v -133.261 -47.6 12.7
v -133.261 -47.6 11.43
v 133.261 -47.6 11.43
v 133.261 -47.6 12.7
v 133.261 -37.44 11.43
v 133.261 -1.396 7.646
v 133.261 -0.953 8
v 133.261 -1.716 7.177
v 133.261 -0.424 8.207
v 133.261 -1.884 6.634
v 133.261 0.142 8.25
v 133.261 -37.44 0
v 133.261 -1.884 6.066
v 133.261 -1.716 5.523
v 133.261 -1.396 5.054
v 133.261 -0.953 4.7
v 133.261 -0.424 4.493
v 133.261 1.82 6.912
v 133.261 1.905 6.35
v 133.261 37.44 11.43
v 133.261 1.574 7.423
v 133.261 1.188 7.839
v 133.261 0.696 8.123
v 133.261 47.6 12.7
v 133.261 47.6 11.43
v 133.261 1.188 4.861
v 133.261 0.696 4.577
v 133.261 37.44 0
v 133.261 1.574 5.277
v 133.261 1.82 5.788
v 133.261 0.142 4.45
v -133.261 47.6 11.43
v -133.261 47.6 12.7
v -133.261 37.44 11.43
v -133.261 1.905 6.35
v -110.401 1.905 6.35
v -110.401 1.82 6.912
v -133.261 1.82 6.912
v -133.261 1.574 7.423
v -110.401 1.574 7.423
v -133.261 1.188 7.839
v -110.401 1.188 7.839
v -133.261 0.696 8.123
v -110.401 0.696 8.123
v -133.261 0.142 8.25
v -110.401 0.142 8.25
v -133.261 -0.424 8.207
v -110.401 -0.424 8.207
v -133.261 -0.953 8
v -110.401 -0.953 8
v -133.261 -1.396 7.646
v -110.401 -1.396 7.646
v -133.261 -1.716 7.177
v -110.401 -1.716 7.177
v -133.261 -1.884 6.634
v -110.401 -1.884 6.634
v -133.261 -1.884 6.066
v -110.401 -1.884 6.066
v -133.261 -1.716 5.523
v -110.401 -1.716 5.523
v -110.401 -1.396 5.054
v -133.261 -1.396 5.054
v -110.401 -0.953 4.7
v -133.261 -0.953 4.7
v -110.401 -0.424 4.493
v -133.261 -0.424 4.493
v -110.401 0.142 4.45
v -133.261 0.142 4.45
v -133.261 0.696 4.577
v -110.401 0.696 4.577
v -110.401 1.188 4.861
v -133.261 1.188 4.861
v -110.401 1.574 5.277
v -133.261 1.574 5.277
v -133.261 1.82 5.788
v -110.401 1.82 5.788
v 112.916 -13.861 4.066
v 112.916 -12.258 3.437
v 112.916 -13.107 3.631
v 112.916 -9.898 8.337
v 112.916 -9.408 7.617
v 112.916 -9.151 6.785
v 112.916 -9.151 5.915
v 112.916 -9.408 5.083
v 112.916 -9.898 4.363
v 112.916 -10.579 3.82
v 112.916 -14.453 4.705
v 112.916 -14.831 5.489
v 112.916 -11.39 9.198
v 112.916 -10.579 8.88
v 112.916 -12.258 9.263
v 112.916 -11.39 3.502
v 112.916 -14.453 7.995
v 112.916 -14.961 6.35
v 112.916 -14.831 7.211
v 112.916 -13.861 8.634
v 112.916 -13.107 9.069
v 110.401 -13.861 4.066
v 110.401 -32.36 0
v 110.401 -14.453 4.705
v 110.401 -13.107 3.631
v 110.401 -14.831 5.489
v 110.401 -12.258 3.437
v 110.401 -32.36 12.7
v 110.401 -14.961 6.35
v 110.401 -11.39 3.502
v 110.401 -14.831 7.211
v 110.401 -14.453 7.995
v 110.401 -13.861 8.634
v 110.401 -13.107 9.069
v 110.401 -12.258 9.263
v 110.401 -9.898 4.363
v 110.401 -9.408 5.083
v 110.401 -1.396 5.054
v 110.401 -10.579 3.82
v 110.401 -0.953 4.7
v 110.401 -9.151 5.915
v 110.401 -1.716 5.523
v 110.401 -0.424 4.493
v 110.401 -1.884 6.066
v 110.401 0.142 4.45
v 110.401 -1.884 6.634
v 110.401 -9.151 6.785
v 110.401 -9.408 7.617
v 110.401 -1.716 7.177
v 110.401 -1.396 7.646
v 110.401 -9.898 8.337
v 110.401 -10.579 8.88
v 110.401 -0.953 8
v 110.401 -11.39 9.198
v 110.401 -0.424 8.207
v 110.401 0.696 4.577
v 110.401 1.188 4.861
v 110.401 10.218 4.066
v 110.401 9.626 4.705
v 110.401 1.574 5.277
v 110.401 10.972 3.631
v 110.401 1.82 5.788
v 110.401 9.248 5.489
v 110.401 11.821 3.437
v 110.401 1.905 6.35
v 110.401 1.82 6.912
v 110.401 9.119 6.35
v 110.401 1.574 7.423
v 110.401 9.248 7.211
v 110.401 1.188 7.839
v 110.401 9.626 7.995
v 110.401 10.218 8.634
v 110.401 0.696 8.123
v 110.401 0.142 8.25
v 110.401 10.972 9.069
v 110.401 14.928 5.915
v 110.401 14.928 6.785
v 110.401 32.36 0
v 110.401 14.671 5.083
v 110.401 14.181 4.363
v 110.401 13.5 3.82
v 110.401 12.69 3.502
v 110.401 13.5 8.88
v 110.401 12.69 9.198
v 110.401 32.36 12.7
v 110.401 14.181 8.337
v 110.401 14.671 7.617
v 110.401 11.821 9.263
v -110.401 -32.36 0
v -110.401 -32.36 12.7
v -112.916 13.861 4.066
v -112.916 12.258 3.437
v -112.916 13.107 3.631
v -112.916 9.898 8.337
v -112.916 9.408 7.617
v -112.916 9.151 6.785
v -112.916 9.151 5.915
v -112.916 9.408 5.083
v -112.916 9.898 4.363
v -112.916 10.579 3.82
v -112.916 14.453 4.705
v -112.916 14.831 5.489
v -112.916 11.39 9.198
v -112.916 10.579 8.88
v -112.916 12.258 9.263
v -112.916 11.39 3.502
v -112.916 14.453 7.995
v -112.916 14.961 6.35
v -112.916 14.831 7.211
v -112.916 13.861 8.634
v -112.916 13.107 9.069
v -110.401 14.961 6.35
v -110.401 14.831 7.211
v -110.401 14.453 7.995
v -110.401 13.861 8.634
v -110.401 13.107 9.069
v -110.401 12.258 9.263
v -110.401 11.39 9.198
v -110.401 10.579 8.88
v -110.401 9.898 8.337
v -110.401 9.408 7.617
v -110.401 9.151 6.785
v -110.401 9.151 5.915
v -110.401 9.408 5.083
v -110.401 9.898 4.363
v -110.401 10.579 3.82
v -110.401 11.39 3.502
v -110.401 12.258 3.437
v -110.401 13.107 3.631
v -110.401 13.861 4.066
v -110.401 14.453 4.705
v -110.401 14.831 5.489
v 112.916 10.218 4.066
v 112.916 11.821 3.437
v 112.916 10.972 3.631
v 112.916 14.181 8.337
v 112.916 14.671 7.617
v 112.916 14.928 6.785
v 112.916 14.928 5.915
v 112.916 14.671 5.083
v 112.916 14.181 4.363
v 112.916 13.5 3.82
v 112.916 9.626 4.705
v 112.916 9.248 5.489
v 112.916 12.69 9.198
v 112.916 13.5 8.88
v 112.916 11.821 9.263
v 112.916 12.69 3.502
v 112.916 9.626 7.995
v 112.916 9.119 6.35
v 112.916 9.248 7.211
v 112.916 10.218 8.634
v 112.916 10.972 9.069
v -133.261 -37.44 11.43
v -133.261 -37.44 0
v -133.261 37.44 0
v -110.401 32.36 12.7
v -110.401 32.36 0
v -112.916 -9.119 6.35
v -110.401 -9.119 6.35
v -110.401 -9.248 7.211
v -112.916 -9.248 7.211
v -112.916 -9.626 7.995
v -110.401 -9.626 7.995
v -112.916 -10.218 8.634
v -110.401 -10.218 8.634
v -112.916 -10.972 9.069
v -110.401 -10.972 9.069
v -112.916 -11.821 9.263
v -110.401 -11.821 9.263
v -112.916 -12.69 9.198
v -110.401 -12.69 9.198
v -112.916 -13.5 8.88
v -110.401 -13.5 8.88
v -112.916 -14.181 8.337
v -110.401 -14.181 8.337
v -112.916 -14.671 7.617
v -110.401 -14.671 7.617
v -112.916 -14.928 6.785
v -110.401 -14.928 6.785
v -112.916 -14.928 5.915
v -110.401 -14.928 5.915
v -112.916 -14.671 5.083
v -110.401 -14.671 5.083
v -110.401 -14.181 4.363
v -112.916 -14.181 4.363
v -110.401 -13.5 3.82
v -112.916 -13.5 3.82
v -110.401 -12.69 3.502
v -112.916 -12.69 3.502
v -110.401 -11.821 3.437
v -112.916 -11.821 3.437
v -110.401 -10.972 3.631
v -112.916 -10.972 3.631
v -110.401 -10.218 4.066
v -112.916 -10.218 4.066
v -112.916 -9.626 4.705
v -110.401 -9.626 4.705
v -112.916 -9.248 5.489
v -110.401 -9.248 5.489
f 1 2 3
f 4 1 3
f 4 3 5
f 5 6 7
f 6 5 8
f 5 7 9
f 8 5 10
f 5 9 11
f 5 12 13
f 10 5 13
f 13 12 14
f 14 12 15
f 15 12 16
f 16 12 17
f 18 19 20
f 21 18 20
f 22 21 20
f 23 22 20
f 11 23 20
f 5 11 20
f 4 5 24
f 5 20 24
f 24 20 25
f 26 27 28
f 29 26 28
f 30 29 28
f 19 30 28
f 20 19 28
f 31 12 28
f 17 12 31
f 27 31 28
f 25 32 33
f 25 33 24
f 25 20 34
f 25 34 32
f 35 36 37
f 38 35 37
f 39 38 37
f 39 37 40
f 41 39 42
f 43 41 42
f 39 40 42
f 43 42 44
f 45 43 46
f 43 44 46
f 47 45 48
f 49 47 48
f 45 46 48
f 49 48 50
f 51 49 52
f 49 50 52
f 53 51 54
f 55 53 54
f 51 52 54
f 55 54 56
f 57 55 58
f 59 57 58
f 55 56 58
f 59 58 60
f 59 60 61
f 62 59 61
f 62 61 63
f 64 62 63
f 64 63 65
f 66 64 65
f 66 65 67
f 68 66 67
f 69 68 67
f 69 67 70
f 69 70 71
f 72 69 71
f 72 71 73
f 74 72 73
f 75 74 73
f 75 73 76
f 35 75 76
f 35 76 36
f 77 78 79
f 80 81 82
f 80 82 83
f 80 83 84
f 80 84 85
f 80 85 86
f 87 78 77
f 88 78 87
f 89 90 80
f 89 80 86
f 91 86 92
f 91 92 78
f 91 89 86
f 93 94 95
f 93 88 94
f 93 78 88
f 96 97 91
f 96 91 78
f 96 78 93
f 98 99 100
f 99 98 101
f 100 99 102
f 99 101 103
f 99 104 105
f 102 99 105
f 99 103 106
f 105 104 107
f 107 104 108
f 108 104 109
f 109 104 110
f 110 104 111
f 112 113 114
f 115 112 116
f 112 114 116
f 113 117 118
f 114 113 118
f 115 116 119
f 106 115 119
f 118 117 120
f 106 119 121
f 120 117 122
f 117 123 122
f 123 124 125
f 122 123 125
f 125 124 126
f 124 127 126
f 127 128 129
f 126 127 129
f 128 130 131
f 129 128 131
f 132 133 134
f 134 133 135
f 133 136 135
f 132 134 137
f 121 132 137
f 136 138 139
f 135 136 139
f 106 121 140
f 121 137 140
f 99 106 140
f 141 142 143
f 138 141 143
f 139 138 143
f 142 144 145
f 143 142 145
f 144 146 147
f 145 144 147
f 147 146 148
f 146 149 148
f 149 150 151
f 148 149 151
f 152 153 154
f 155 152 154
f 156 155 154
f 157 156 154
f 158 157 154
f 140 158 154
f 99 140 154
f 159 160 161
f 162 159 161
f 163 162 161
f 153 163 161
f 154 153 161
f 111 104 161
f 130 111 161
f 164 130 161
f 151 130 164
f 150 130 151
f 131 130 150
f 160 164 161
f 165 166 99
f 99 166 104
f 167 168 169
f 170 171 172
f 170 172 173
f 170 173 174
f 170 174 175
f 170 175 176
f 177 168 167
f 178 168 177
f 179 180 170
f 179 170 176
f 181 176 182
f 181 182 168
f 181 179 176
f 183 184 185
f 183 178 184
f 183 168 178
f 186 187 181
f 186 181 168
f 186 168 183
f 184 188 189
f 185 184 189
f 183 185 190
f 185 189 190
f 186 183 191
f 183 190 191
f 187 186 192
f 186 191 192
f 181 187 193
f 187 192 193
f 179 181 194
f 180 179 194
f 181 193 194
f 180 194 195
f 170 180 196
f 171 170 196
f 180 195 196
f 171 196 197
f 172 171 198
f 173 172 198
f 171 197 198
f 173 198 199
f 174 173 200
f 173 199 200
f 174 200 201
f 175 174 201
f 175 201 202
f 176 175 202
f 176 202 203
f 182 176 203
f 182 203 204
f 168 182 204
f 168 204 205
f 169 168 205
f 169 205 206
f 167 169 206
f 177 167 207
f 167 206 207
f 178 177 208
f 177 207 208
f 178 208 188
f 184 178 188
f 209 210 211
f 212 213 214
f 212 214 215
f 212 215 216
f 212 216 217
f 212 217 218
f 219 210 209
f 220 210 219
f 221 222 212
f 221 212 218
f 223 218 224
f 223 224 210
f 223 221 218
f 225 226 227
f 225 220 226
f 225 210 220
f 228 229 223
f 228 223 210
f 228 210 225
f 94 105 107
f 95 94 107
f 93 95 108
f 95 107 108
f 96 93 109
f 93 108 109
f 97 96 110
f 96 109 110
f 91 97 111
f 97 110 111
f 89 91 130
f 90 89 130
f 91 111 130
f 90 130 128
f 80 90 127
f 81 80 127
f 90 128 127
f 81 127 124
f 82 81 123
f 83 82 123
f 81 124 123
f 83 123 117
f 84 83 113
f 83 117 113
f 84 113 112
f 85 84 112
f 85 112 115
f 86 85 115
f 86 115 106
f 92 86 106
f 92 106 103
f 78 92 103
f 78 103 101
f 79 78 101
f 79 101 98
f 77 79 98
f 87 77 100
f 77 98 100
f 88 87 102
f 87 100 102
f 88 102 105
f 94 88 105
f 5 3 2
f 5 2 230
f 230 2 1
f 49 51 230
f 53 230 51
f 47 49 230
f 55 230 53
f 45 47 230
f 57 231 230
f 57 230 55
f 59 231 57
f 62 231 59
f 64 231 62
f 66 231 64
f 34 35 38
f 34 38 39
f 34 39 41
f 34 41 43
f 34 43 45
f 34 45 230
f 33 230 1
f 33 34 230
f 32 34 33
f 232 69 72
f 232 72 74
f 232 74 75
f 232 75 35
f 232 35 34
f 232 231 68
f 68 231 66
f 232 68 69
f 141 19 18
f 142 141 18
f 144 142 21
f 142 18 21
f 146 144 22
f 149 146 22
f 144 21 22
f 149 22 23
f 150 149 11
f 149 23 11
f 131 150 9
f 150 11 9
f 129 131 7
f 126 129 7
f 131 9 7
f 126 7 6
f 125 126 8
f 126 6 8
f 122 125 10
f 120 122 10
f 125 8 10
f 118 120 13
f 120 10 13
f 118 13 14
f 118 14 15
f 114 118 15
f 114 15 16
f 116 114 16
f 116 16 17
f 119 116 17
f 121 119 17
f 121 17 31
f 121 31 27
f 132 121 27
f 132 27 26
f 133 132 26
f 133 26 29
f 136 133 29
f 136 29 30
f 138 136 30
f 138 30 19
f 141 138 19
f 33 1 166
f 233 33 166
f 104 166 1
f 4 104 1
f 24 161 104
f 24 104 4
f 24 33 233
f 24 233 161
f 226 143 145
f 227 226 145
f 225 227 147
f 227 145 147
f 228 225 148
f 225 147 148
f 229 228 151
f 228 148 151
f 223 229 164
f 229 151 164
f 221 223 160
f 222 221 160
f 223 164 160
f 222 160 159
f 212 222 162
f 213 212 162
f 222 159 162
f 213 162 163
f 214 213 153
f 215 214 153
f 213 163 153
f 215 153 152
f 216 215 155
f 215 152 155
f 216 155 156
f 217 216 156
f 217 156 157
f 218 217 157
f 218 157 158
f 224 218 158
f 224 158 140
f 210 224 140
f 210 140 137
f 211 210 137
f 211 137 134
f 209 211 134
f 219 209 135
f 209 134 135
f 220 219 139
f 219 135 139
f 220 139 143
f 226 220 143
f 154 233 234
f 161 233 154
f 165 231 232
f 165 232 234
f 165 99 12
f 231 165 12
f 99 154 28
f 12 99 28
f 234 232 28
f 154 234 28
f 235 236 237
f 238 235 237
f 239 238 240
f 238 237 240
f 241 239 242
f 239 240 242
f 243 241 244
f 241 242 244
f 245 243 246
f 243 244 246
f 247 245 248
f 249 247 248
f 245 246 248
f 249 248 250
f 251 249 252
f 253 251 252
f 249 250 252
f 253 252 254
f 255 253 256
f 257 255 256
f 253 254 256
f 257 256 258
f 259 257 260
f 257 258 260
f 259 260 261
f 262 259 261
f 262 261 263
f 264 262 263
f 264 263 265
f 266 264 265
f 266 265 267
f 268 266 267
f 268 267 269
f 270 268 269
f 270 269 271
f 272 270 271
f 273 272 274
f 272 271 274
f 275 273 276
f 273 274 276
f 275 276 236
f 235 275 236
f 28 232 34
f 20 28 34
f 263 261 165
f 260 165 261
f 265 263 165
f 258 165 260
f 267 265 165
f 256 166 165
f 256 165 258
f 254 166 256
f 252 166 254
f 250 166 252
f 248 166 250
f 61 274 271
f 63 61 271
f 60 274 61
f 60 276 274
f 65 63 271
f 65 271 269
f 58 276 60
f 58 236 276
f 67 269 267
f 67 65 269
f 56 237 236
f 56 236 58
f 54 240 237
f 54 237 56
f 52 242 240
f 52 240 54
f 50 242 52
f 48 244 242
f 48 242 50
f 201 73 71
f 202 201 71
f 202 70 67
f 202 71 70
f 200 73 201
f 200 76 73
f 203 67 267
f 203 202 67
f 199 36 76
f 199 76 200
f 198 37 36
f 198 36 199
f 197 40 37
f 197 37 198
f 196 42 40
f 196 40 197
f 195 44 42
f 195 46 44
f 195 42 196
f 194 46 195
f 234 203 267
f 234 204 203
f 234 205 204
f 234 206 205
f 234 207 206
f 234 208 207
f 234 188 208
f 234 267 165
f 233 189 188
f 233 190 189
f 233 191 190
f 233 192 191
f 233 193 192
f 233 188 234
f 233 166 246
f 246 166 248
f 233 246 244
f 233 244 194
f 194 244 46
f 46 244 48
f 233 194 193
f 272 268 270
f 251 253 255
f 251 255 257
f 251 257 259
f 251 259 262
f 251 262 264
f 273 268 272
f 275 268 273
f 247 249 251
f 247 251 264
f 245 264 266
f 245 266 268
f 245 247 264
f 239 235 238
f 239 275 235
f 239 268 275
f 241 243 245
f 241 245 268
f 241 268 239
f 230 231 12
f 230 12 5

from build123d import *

# Parameters (mm, degrees)
F0_W      = 266.5222
F0_H      = 95.1992
F1_DEPTH  = 12.7
F2_W      = 220.8022
F2_H      = 64.7192
F2_W_2    = 215.7222
F2_H_2    = 44.3992
F3_DEPTH  = 25.4
F4_R      = 1.905
F5_DEPTH  = 508
F6_R      = 2.921
F7_DEPTH  = 2.5146
F8_R      = 2.921
F9_DEPTH  = 2.5146
F10_W     = 10.16
F10_H     = 11.43
F11_DEPTH = 508


with BuildPart() as f1:
    # F0 (on Top) → F1 (new body)
    with BuildSketch(Plane.XY):
        Rectangle(F0_W, F0_H)
    extrude(amount=F1_DEPTH)

    # F2 (on face) → F3 (cut)
    with BuildSketch(Plane.XY.offset(12.7)):
        Rectangle(F2_W, F2_H)
        Rectangle(F2_W_2, F2_H_2, mode=Mode.SUBTRACT)
        Rectangle(F2_W_2, F2_H_2)
    extrude(amount=-F3_DEPTH, mode=Mode.SUBTRACT)

    # F4 (on face) → F5 (cut)
    with BuildSketch(Plane.YZ.offset(133.2611)):
        with Locations((0, 6.35)):
            Circle(F4_R)
    extrude(amount=-F5_DEPTH, mode=Mode.SUBTRACT)

    # F6 (on face) → F7 (cut)
    with BuildSketch(Plane.YZ.offset(-110.4011)):
        with Locations((-12.0396, 6.35)):
            Circle(F6_R)
        with Locations((12.0396, 6.35)):
            Circle(F6_R)
    extrude(amount=-F7_DEPTH, mode=Mode.SUBTRACT)

    # F8 (on face) → F9 (cut)
    with BuildSketch(Plane(origin=(110.4011, 0, 0), x_dir=(0, -1, 0), z_dir=(-1, 0, 0))):
        with Locations((-12.0396, 6.35)):
            Circle(F8_R)
        with Locations((12.0396, 6.35)):
            Circle(F8_R)
    extrude(amount=-F9_DEPTH, mode=Mode.SUBTRACT)

    # F10 (on face) → F11 (cut)
    with BuildSketch(Plane.YZ.offset(133.2611)):
        with Locations((-42.5196, 5.715)):
            Rectangle(F10_W, F10_H)
        with Locations((42.5196, 5.715)):
            Rectangle(F10_W, F10_H)
    extrude(amount=-F11_DEPTH, mode=Mode.SUBTRACT)


solid = f1.part
